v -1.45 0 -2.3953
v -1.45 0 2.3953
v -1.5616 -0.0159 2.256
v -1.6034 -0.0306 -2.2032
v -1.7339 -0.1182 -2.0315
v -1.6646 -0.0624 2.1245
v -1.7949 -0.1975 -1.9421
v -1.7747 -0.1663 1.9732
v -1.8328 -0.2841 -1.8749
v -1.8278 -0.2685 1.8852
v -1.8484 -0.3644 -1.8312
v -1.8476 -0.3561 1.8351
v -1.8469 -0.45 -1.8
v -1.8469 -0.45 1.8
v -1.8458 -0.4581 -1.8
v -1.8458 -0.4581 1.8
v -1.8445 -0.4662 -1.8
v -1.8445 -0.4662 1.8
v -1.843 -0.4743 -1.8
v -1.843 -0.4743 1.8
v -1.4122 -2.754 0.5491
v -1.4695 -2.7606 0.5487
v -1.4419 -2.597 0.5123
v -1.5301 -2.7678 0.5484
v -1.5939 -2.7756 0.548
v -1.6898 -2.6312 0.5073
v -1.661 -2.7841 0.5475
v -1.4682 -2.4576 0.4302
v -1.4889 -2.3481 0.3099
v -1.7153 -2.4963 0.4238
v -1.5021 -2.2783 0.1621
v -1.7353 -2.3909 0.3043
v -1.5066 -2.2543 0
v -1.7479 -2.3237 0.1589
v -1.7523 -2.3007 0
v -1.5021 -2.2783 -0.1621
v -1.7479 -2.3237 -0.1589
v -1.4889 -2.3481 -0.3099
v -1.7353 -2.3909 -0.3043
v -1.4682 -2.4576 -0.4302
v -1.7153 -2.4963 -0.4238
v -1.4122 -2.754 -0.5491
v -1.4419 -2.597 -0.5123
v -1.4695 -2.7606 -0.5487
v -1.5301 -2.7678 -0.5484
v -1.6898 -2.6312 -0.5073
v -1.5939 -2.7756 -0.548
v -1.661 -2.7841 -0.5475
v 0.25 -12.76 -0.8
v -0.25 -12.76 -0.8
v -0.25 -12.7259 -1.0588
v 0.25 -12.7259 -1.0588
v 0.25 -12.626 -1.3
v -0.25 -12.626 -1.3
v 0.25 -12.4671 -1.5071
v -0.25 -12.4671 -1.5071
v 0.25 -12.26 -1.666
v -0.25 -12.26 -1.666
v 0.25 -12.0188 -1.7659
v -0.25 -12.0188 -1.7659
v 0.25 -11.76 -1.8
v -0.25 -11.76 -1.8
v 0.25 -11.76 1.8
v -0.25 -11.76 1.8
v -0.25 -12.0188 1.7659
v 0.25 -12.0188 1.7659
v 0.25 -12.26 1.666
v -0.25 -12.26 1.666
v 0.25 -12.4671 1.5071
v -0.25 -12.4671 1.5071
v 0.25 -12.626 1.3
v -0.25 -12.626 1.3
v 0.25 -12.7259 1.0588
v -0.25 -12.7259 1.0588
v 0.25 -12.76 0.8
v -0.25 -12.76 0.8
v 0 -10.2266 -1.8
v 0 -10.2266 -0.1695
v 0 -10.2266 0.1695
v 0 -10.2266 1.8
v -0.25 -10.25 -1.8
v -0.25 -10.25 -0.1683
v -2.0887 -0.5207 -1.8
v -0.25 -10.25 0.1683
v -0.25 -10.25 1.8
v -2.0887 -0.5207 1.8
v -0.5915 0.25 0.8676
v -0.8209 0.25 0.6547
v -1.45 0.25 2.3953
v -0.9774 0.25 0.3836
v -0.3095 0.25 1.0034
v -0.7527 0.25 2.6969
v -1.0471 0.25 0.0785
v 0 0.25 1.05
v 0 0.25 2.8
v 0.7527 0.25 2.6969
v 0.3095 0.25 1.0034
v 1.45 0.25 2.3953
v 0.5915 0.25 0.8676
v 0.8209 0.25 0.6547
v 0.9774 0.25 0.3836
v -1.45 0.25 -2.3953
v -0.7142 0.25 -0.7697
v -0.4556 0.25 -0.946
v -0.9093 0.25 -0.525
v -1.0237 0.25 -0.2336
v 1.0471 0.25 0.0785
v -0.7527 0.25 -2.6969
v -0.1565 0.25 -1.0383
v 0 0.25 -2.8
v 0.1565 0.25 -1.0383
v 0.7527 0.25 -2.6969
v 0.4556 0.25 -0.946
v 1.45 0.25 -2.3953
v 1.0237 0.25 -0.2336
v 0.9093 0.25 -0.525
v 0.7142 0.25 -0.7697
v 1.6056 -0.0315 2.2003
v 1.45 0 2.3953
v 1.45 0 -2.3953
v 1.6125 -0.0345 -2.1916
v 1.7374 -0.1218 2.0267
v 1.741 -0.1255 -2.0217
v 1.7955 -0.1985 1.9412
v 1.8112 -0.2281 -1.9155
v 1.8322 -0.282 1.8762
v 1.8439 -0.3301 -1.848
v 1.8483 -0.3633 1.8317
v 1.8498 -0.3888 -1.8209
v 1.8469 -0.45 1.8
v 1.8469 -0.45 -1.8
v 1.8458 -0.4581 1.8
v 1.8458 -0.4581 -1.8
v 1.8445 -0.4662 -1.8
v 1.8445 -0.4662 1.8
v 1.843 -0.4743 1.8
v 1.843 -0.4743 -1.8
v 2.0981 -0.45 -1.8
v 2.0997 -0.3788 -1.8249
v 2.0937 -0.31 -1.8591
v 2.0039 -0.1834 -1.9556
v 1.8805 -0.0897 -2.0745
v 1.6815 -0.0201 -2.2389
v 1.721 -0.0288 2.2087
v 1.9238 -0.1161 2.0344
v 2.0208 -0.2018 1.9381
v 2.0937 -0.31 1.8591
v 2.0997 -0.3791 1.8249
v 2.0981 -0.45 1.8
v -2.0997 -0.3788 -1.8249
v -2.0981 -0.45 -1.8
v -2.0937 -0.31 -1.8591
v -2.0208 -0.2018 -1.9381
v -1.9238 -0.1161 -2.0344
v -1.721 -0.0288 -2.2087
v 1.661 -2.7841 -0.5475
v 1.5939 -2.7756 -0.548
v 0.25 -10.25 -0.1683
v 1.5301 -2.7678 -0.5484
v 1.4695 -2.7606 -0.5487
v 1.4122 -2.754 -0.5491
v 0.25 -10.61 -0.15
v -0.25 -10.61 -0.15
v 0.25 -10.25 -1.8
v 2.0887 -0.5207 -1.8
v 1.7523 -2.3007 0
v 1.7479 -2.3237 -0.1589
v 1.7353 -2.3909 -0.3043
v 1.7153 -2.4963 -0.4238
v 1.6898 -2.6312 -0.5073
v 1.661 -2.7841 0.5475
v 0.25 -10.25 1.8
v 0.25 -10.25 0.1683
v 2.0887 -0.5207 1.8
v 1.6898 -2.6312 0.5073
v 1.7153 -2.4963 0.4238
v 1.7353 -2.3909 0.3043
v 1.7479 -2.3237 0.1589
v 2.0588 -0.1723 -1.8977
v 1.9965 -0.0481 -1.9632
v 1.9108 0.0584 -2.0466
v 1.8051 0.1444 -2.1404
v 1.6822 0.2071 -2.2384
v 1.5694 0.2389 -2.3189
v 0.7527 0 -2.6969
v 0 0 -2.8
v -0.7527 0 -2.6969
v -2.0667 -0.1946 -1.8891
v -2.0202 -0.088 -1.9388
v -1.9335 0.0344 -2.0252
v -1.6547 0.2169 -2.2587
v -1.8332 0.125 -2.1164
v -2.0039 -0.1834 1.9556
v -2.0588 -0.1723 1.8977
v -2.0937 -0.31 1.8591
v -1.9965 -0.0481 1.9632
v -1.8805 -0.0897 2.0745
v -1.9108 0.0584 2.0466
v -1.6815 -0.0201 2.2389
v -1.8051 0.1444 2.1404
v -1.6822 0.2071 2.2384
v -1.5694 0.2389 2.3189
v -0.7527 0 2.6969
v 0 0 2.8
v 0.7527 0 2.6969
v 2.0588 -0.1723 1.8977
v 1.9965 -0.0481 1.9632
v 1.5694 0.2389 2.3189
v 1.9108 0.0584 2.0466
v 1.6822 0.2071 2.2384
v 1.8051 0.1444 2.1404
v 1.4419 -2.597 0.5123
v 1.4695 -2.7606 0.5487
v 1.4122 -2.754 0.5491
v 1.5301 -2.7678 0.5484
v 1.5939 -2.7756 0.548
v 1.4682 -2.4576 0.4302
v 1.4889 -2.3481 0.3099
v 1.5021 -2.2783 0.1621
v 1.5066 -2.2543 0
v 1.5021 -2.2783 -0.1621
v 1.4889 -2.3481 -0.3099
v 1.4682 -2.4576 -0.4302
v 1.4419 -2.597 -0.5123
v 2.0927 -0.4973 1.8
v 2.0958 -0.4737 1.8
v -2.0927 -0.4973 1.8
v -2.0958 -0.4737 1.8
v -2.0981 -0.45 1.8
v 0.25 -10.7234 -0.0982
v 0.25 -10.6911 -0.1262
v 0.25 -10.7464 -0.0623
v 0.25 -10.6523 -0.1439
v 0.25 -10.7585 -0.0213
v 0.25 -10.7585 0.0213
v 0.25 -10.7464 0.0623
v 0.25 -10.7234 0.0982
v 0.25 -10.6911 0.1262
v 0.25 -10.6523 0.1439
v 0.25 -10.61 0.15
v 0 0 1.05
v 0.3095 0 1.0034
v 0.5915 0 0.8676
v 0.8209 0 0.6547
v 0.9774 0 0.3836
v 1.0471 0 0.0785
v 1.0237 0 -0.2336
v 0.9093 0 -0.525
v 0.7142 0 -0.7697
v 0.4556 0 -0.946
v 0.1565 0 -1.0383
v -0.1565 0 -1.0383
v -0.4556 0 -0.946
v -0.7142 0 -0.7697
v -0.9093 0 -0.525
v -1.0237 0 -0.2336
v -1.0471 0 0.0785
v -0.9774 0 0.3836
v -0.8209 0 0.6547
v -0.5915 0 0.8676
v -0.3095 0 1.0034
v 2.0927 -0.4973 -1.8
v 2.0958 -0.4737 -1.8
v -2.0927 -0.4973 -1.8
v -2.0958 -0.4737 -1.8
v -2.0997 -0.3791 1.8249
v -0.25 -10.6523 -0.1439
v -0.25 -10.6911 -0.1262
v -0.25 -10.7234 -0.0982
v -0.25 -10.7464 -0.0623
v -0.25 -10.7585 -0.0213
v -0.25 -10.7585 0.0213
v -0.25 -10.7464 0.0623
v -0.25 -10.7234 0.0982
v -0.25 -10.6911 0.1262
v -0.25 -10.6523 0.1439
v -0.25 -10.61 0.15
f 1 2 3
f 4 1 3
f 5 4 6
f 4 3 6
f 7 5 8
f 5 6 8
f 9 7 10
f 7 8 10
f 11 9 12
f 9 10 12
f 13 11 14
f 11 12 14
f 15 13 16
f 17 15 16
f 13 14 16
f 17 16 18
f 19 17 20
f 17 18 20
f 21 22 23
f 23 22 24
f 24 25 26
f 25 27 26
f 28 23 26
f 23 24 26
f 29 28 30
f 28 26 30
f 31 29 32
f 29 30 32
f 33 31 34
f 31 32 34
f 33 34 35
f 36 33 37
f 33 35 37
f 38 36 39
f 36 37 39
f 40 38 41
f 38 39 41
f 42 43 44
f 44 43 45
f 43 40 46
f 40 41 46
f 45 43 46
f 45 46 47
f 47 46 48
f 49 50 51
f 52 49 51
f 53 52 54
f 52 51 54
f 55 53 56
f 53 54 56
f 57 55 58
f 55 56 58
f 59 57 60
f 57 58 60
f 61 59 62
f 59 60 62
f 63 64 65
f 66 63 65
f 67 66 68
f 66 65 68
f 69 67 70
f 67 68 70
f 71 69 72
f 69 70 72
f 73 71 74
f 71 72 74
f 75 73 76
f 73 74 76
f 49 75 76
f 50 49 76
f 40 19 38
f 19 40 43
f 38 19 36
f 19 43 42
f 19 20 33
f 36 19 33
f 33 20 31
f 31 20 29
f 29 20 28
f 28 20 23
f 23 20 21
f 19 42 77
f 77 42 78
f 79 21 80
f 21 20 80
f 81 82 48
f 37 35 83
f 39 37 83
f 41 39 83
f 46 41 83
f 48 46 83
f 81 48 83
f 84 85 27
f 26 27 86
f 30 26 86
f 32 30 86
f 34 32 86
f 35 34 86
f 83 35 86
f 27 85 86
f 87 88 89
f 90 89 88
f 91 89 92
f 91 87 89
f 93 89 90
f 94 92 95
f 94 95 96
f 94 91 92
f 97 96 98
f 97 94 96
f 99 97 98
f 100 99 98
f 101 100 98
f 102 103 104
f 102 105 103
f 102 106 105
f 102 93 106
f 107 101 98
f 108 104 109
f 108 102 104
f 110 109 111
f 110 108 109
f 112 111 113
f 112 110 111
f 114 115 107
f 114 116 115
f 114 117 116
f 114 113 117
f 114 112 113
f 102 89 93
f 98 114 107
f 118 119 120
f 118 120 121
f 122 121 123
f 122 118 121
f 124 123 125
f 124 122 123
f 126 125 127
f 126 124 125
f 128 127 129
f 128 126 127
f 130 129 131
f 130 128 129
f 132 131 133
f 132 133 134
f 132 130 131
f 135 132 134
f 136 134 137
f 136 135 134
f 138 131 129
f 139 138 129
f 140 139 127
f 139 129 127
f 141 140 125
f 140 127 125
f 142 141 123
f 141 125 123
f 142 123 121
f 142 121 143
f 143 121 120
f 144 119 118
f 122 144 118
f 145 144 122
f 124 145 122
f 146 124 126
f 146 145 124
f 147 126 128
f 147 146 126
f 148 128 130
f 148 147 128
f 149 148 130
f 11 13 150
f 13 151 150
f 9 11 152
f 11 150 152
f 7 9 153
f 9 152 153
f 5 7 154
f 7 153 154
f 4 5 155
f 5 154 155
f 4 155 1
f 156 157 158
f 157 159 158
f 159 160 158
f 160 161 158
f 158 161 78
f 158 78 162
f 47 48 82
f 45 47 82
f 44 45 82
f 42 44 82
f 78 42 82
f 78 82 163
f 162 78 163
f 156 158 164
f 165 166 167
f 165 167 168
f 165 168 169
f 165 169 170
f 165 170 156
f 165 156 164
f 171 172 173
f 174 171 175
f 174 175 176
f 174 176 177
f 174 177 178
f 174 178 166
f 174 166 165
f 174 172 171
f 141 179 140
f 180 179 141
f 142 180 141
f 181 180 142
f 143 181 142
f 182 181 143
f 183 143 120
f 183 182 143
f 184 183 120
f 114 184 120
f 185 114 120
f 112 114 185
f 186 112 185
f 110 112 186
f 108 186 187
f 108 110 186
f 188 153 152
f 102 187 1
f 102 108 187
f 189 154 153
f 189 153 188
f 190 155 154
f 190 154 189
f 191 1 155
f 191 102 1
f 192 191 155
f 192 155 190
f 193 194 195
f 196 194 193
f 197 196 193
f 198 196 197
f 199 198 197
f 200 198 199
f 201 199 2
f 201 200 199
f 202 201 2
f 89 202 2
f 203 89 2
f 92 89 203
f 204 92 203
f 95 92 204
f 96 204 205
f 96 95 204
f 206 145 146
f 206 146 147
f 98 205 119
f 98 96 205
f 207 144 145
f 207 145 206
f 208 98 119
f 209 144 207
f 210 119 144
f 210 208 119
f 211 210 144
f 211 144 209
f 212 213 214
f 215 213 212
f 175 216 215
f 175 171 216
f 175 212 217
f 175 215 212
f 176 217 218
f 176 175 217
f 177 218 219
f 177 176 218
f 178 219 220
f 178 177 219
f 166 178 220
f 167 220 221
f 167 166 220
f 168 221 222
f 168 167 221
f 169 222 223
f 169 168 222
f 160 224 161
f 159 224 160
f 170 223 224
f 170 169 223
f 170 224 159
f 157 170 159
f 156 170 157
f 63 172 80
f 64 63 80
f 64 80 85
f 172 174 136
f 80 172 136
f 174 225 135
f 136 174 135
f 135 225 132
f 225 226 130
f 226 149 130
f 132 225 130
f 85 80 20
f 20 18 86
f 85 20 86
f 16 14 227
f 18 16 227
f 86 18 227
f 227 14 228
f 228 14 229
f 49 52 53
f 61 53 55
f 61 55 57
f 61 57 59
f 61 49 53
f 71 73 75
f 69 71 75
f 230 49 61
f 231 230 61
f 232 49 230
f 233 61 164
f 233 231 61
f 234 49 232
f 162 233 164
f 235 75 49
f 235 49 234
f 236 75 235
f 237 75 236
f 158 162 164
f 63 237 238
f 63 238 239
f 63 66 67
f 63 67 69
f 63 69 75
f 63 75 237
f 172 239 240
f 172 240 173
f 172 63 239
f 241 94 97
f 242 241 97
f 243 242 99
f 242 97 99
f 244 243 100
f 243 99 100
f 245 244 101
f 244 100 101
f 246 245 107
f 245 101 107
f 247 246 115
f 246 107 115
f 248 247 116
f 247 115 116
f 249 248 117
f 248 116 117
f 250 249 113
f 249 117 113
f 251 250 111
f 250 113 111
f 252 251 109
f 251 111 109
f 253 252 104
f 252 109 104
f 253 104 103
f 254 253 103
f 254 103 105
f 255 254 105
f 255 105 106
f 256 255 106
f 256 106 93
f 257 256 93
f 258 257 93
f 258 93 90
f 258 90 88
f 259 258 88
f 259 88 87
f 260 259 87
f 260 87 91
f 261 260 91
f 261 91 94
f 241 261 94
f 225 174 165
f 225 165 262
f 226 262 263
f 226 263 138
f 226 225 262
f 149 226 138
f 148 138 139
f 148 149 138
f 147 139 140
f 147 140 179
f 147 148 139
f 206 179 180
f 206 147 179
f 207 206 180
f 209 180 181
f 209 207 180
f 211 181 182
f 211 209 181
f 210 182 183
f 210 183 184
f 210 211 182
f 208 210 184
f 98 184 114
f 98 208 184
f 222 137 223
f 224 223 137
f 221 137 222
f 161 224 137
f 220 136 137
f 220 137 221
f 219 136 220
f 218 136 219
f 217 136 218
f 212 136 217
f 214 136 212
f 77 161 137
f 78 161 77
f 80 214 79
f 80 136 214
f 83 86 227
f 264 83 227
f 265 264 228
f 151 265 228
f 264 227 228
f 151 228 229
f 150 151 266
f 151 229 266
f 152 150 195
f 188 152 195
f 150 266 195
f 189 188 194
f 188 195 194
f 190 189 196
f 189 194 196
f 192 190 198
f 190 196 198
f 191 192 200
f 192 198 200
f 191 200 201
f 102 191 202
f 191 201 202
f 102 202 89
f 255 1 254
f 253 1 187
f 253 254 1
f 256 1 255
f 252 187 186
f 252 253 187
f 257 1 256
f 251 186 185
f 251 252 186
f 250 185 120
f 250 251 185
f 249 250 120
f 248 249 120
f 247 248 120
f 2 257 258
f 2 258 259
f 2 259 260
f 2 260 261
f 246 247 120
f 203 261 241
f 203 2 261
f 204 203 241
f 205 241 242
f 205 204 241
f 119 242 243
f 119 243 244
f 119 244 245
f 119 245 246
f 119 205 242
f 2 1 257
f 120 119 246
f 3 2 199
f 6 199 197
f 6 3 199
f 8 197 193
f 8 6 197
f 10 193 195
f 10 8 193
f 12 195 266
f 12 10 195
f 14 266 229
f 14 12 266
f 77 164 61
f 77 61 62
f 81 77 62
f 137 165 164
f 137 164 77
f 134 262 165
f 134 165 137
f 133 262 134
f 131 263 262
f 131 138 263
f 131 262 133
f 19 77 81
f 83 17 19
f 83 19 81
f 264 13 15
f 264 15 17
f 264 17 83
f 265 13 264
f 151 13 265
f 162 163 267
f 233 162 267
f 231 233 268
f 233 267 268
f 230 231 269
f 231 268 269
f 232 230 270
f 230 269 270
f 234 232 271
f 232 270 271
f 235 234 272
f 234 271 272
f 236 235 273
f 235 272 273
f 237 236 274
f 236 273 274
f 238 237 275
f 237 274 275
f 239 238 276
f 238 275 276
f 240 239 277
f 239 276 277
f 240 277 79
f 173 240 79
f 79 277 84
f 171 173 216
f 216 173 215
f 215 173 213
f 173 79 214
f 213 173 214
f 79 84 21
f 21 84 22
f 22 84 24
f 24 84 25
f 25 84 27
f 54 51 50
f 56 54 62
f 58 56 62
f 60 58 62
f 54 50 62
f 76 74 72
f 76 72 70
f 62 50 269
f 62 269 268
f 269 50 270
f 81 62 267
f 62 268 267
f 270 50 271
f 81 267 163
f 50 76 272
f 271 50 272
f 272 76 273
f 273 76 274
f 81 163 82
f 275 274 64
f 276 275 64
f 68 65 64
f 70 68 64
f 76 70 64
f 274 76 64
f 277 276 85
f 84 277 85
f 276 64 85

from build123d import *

# Parameters (mm, degrees)
ESBO_O1_R                = 1.05
RESSALTO_EXTRUS_O1_DEPTH = 0.25
RESSALTO_EXTRUS_O2_DEPTH = 1.8
FILETE1_R                = 1
RESSALTO_EXTRUS_O4_DEPTH = 2
CORTE_EXTRUS_O6_DEPTH    = 5
ESBO_O5_R                = 1.05
RESSALTO_EXTRUS_O3_DEPTH = 0.7
CORTE_EXTRUS_O1_DEPTH    = 5
CORTE_EXTRUS_O2_DEPTH    = 15


with BuildPart() as part:
    # Esboço1 → Ressalto-extrusão1 (new body)
    with BuildSketch(Plane(origin=(0, 0, 0), x_dir=(1, 0, 0), z_dir=(0, 1, 0))):
        with BuildLine():
            Line((2.079062289, 1.8), (14, 1.8))
            ThreePointArc((14, 1.8), (14.707106781, 1.507106781), (15, 0.8))
            Line((15, 0.8), (15, -0.8))
            ThreePointArc((15, -0.8), (14.707106781, -1.507106781), (14, -1.8))
            Line((14, -1.8), (2.079062289, -1.8))
            ThreePointArc((2.079062289, -1.8), (0, -2.75), (-2.079062289, -1.8))
            Line((-2.079062289, -1.8), (-14, -1.8))
            ThreePointArc((-14, -1.8), (-14.707106781, -1.507106781), (-15, -0.8))
            Line((-15, -0.8), (-15, 0.8))
            ThreePointArc((-15, 0.8), (-14.707106781, 1.507106781), (-14, 1.8))
            Line((-14, 1.8), (-2.079062289, 1.8))
            ThreePointArc((-2.079062289, 1.8), (0, 2.75), (2.079062289, 1.8))
        make_face()
        with Locations(Location((0, 0, 0), (0, 0, 270))):
            Circle(ESBO_O1_R, mode=Mode.SUBTRACT)
        with BuildLine():
            Line((4.978511643, 0.549893952), (12.857420168, 0.15))
            ThreePointArc((12.857420168, 0.15), (13, 0), (12.857420168, -0.15))
            Line((12.857420168, -0.15), (4.978511643, -0.549893952))
            ThreePointArc((4.978511643, -0.549893952), (4.4, 0), (4.978511643, 0.549893952))
        make_face(mode=Mode.SUBTRACT)
        with BuildLine():
            Line((-12.857420168, -0.15), (-4.978511643, -0.549893952))
            ThreePointArc((-4.978511643, -0.549893952), (-4.4, 0), (-4.978511643, 0.549893952))
            Line((-4.978511643, 0.549893952), (-12.857420168, 0.15))
            ThreePointArc((-12.857420168, 0.15), (-13, 0), (-12.857420168, -0.15))
        make_face(mode=Mode.SUBTRACT)
    extrude(amount=RESSALTO_EXTRUS_O1_DEPTH)


with BuildPart() as body_2:
    # Esboço4 → Ressalto-extrusão2 (new, symmetric)
    with BuildSketch(Plane.XY):
        with BuildLine():
            Line((0, -10.226584075), (0, -12.76))
            Line((0, -12.76), (-0.25, -12.76))
            Line((-0.25, -12.76), (-0.25, -10.25))
            Line((-0.25, -10.25), (-2.088694427, -0.52070389))
            ThreePointArc((-2.088694427, -0.52070389), (-1.950478535, 0.014754428), (-1.45, 0.25))
            Line((-1.45, 0.25), (-1.45, 0))
            ThreePointArc((-1.45, 0), (-1.757986791, -0.144766506), (-1.843042724, -0.474279317))
            Line((-1.843042724, -0.474279317), (0, -10.226584075))
        make_face()
    extrude(amount=RESSALTO_EXTRUS_O2_DEPTH, both=True)

    # Filete1
    filete1_edges = [body_2.edges().sort_by_distance(p)[0] for p in [
        (-0.125, -12.76, 1.8),
        (-0.125, -12.76, -1.8),
    ]]
    fillet(filete1_edges, radius=FILETE1_R)


with BuildPart() as body_3:
    # Esboço16 → Ressalto-extrusão4 (new, symmetric)
    with BuildSketch(Plane.ZY.offset(0.25)):
        with BuildLine():
            Line((0.15, -10.61), (0.549854071, -2.738494336))
            ThreePointArc((0.549854071, -2.738494336), (0, -2.16), (-0.549854071, -2.738494336))
            Line((-0.549854071, -2.738494336), (-0.15, -10.61))
            ThreePointArc((-0.15, -10.61), (0, -10.76), (0.15, -10.61))
        make_face()
    extrude(amount=RESSALTO_EXTRUS_O4_DEPTH, both=True)

    # Esboço17 → Corte-extrusão6 (cut, symmetric)
    with BuildSketch(Plane(origin=(-2.111680199, -0.399076621, 0), x_dir=(0, 0, 1), z_dir=(-0.9826068107203668, -0.18569829166136476, 0))):
        with BuildLine():
            Line((-0.55, -2.513436729), (-0.175, -10.025295237))
            Line((-0.175, -10.025295237), (-1.291075027, -10.025295237))
            Line((-1.291075027, -10.025295237), (-1.291075027, -1.561962936))
            Line((-1.291075027, -1.561962936), (1.201455883, -1.561962936))
            Line((1.201455883, -1.561962936), (1.201455883, -10.025295237))
            Line((1.201455883, -10.025295237), (0.175, -10.025295237))
            Line((0.175, -10.025295237), (0.55, -2.513436729))
            ThreePointArc((0.55, -2.513436729), (0, -1.935295237), (-0.55, -2.513436729))
        make_face()
    extrude(amount=CORTE_EXTRUS_O6_DEPTH, both=True, mode=Mode.SUBTRACT)


with BuildPart() as body_2_1:
    add(body_2.part)

    # Combinar2: cut body 3
    add(body_3.part, mode=Mode.SUBTRACT)


with BuildPart() as body_3_2:
    # Espelhar1: mirrored copy
    add(body_2_1.part.mirror(Plane(origin=(0, 0, 0), x_dir=(0, 0, 1), z_dir=(1, 0, 0))))


with BuildPart() as body_4:
    # Esboço5 → Ressalto-extrusão3 (new body)
    with BuildSketch(Plane(origin=(0, 0.25, 0), x_dir=(1, 0, 0), z_dir=(0, 1, 0))):
        with BuildLine():
            Line((-2.1, 1.852025918), (-2.1, -1.852025918))
            ThreePointArc((-2.1, -1.852025918), (0, -2.8), (2.1, -1.852025918))
            Line((2.1, -1.852025918), (2.1, 1.852025918))
            ThreePointArc((2.1, 1.852025918), (0, 2.8), (-2.1, 1.852025918))
        make_face()
        with Locations(Location((0, 0, 0), (0, 0, 270))):
            Circle(ESBO_O5_R, mode=Mode.SUBTRACT)
    extrude(amount=-RESSALTO_EXTRUS_O3_DEPTH)

    # Esboço6 → Corte-extrusão1 (cut, symmetric)
    with BuildSketch(Plane.XY):
        with BuildLine():
            Line((-1.45, 0.25), (-1.45, 0.597201145))
            Line((-1.45, 0.597201145), (-2.428627535, 0.597201145))
            Line((-2.428627535, 0.597201145), (-2.428627535, -0.52070389))
            Line((-2.428627535, -0.52070389), (-2.088694427, -0.52070389))
            ThreePointArc((-2.088694427, -0.52070389), (-1.950478535, 0.014754428), (-1.45, 0.25))
        make_face()
        with BuildLine():
            Line((1.45, 0.25), (1.45, 0.729701811))
            Line((1.45, 0.729701811), (2.688745217, 0.729701811))
            Line((2.688745217, 0.729701811), (2.688745217, -0.52070389))
            Line((2.688745217, -0.52070389), (2.088694427, -0.52070389))
            ThreePointArc((2.088694427, -0.52070389), (1.950478535, 0.014754428), (1.45, 0.25))
        make_face()
        with BuildLine():
            Line((-1.45, 0), (1.45, 0))
            ThreePointArc((1.45, 0), (1.757986791, -0.144766506), (1.843042724, -0.474279317))
            Line((1.843042724, -0.474279317), (-1.843042724, -0.474279317))
            ThreePointArc((-1.843042724, -0.474279317), (-1.757986791, -0.144766506), (-1.45, 0))
        make_face()
    extrude(amount=CORTE_EXTRUS_O1_DEPTH, both=True, mode=Mode.SUBTRACT)

    # Combinar1: union body 3 2, body 2
    add(body_3_2.part)
    add(body_2_1.part)

    # Esboço7 → Corte-extrusão2 (cut, symmetric)
    with BuildSketch(Plane(origin=(0, 0, 0), x_dir=(0, 0, -1), z_dir=(1, 0, 0))):
        with BuildLine():
            Line((2.395307913, 0), (3.16000301, 0))
            Line((3.16000301, 0), (3.16000301, -0.618768346))
            Line((3.16000301, -0.618768346), (1.8, -0.618768346))
            Line((1.8, -0.618768346), (1.8, -0.45))
            ThreePointArc((1.8, -0.45), (2.022182093, -0.125157783), (2.395307913, 0))
        make_face()
        with BuildLine():
            Line((-1.8, -0.45), (-1.8, -0.594962274))
            Line((-1.8, -0.594962274), (-2.989404484, -0.594962274))
            Line((-2.989404484, -0.594962274), (-2.989404484, 0))
            Line((-2.989404484, 0), (-2.395307913, 0))
            ThreePointArc((-2.395307913, 0), (-2.022182093, -0.125157783), (-1.8, -0.45))
        make_face()
    extrude(amount=CORTE_EXTRUS_O2_DEPTH, both=True, mode=Mode.SUBTRACT)


solid = body_4.part
